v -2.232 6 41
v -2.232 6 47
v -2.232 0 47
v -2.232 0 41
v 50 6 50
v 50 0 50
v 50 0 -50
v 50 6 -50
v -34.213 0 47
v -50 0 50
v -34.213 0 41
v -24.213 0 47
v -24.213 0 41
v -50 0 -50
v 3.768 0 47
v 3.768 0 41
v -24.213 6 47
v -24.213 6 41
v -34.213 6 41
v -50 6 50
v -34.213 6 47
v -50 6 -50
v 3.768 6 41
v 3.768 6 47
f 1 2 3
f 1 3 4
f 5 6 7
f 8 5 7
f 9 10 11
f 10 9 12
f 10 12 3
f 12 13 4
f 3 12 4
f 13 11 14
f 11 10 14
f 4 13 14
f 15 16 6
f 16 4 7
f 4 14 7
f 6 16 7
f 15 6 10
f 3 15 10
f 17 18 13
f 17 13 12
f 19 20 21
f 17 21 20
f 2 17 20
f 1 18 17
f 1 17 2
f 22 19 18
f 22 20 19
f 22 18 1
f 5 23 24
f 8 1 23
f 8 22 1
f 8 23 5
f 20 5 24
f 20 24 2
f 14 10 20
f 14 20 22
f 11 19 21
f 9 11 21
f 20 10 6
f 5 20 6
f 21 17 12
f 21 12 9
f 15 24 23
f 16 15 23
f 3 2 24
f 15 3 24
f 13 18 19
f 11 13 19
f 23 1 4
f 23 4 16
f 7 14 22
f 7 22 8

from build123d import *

# Parameters (mm, degrees)
SKETCH1_W                = 100
SKETCH1_H                = 100
BOSS_EXTRUDE1_DEPTH      = 6
SKETCH6_W                = 6
SKETCH6_H                = 6
CUT_EXTRUDE1_DEPTH       = 4
CUT_EXTRUDE1_DEPTH_BACK  = 4
SKETCH62_W               = 10
SKETCH62_H               = 6
CUT_EXTRUDE12_DEPTH      = 4
CUT_EXTRUDE12_DEPTH_BACK = 4


with BuildPart() as part:
    # Sketch1 → Boss-Extrude1 (new body)
    with BuildSketch(Plane(origin=(0, 0, 0), x_dir=(1, 0, 0), z_dir=(0, 1, 0))):
        Rectangle(SKETCH1_W, SKETCH1_H)
    extrude(amount=BOSS_EXTRUDE1_DEPTH)

    # Sketch6 → Cut-Extrude1 (cut, two sides)
    with BuildSketch(Plane(origin=(0, 3, 0), x_dir=(1, 0, 0), z_dir=(0, 1, 0))) as cut_extrude1_sk:
        with Locations((0.767778608, -44)):
            Rectangle(SKETCH6_W, SKETCH6_H)
    extrude(amount=CUT_EXTRUDE1_DEPTH, mode=Mode.SUBTRACT)
    extrude(cut_extrude1_sk.sketch, amount=-CUT_EXTRUDE1_DEPTH_BACK, mode=Mode.SUBTRACT)

    # Sketch62 → Cut-Extrude12 (cut, two sides)
    with BuildSketch(Plane(origin=(-28.445435161, 3, 88), x_dir=(-1, 0, 0), z_dir=(0, 1, 0))) as cut_extrude12_sk:
        with Locations((0.767778608, -44)):
            Rectangle(SKETCH62_W, SKETCH62_H)
    extrude(amount=CUT_EXTRUDE12_DEPTH, mode=Mode.SUBTRACT)
    extrude(cut_extrude12_sk.sketch, amount=-CUT_EXTRUDE12_DEPTH_BACK, mode=Mode.SUBTRACT)


solid = part.part
